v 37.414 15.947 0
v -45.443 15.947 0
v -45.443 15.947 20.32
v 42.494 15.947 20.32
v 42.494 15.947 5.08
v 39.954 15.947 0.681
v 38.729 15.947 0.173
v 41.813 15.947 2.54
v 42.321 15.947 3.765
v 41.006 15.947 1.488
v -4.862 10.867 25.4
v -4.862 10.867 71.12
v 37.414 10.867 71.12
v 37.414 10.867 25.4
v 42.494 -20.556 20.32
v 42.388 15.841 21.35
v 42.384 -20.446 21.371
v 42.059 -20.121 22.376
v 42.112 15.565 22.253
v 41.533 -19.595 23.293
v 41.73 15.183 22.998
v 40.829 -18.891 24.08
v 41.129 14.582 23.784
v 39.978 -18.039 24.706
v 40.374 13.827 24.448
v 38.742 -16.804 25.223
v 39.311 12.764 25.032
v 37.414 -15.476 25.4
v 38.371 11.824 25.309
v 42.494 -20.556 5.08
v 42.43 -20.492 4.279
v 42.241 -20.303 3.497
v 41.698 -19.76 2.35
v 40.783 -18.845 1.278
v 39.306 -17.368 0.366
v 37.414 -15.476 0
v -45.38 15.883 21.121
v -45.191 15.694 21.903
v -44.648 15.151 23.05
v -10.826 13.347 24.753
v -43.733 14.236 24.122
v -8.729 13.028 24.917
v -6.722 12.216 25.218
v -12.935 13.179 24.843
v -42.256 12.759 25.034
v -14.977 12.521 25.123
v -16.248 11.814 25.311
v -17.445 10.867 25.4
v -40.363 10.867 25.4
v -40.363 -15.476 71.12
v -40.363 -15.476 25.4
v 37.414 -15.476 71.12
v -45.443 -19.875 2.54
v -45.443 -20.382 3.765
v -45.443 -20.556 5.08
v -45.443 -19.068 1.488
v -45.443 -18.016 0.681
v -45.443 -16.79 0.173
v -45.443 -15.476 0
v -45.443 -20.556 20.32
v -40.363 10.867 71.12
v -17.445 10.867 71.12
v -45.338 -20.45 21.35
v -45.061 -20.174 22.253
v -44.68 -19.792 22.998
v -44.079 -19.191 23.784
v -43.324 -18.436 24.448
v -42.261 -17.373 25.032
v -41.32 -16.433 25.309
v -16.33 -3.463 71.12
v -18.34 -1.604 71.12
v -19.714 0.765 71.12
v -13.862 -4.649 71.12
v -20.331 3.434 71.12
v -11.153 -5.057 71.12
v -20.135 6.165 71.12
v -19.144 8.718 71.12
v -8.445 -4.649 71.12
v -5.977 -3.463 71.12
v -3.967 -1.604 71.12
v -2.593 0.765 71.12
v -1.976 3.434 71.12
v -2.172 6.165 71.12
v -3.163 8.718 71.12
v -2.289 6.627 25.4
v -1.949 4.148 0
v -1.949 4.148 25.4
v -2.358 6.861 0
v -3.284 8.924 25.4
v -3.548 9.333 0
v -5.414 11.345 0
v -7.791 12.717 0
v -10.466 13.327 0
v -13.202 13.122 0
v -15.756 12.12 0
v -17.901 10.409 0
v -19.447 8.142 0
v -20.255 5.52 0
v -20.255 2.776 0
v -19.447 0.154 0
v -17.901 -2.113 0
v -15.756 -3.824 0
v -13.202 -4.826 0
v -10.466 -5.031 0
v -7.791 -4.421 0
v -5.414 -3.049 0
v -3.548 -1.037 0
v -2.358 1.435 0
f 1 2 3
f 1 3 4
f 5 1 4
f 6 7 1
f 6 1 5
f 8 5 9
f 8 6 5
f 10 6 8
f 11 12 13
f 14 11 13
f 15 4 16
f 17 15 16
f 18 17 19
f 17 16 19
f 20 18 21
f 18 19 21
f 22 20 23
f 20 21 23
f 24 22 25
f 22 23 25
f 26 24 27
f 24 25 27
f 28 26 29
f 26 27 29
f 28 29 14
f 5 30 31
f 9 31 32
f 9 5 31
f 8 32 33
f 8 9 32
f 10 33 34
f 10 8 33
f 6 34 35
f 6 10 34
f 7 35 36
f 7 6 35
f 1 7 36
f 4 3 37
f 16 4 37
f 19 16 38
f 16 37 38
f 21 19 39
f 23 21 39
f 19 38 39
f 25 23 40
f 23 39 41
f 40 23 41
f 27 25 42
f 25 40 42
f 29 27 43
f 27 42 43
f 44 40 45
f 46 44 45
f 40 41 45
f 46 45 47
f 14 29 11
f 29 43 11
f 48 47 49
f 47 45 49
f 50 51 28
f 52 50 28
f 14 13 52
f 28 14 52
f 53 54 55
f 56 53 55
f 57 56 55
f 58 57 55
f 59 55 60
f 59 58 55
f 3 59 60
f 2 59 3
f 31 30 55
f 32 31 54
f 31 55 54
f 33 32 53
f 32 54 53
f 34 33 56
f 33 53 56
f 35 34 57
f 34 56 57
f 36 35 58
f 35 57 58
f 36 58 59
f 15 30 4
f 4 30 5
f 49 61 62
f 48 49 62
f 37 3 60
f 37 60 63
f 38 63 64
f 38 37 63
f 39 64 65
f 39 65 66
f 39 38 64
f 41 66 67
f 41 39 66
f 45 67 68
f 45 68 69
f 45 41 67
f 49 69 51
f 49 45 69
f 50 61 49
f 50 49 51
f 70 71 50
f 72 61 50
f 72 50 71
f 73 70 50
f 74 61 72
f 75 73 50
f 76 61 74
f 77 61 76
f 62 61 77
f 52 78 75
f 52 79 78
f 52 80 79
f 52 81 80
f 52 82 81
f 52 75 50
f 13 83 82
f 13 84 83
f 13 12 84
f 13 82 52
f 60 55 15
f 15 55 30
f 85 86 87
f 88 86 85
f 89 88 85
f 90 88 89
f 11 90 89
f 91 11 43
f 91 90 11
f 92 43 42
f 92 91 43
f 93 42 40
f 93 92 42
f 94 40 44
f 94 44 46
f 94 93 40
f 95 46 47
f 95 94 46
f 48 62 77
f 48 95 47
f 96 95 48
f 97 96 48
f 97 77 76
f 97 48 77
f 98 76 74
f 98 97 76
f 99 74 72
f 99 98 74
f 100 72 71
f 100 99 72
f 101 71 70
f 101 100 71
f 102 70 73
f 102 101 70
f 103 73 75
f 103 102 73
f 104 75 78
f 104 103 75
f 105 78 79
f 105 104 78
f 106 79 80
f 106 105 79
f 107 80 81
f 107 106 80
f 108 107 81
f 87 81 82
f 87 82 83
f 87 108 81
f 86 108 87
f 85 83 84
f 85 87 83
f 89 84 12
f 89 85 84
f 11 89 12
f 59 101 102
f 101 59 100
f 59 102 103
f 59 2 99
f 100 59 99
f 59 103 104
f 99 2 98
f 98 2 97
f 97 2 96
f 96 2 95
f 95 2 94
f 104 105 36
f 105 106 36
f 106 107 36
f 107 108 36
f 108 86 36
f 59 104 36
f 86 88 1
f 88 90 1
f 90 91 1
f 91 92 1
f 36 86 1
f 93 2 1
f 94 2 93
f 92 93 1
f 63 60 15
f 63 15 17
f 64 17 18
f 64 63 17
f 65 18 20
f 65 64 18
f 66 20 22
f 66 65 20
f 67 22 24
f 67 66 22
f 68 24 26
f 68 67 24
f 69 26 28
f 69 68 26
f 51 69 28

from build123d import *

# Parameters (mm, degrees)
F0_W        = 87.937258184
F0_H        = 36.5022588521
F0_R        = 9.2048285636
F1_DEPTH    = 25.4
F2_T1_DEPTH = 113.337258184
F2_T3_DEPTH = 61.9022588521
F3_DEPTH    = 45.72


# Not quite as in the source:
# - a fillet or chamfer that OpenCascade refuses, or shapes differently, is made with other operations: its cross-section is extruded or revolved along the edge and cut away or added


with BuildPart() as f1:
    # F0 (on Top) → F1 (new body)
    with BuildSketch(Plane.XY):
        with Locations((-1.4748387039, -2.3044357076)):
            Rectangle(F0_W, F0_H)
        with Locations((-11.1534688622, 4.1479840875)):
            Circle(F0_R, mode=Mode.SUBTRACT)
    extrude(amount=F1_DEPTH)

    # F2: fillet of radius 5.08 on 6 edges, made by hand

    # F2_s2 → F2_t1 (cut)
    with BuildSketch(Plane.YZ.offset(-58.1434677958)):
        with BuildLine():
            ThreePointArc((-20.5555651337, 20.32), (-19.0676675821, 23.9121024484), (-15.4755651337, 25.4))
            Line((-15.4755651337, 25.4), (-20.5555651337, 25.4))
            Line((-20.5555651337, 25.4), (-20.5555651337, 20.32))
        make_face()
        with BuildLine():
            ThreePointArc((15.9466937184, 20.32), (14.4587961669, 23.9121024484), (10.8666937184, 25.4))
            Line((10.8666937184, 25.4), (15.9466937184, 25.4))
            Line((15.9466937184, 25.4), (15.9466937184, 20.32))
        make_face()
        with BuildLine():
            ThreePointArc((-20.5555651337, 5.08), (-19.0676675821, 1.4878975516), (-15.4755651337, 0))
            Line((-15.4755651337, 0), (-20.5555651337, 0))
            Line((-20.5555651337, 0), (-20.5555651337, 5.08))
        make_face()
    extrude(amount=F2_T1_DEPTH, mode=Mode.SUBTRACT)

    # F2_s4 → F2_t3 (cut)
    with BuildSketch(Plane.XZ.offset(-28.6466937184)):
        with BuildLine():
            ThreePointArc((-45.4434677958, 20.32), (-43.9555702443, 23.9121024484), (-40.3634677958, 25.4))
            Line((-40.3634677958, 25.4), (-45.4434677958, 25.4))
            Line((-45.4434677958, 25.4), (-45.4434677958, 20.32))
        make_face()
        with BuildLine():
            ThreePointArc((42.4937903881, 20.32), (41.0058928365, 23.9121024484), (37.4137903881, 25.4))
            Line((37.4137903881, 25.4), (42.4937903881, 25.4))
            Line((42.4937903881, 25.4), (42.4937903881, 20.32))
        make_face()
        with BuildLine():
            ThreePointArc((42.4937903881, 5.08), (41.0058928365, 1.4878975516), (37.4137903881, 0))
            Line((37.4137903881, 0), (42.4937903881, 0))
            Line((42.4937903881, 0), (42.4937903881, 5.08))
        make_face()
    extrude(amount=F2_T3_DEPTH, mode=Mode.SUBTRACT)

    # F3 (add): a face of the model
    f3_faces = [f1.faces().sort_by_distance(p)[0] for p in [
        (-0.1621567776, -3.0875160288, 25.4),
    ]]
    extrude(f3_faces, amount=F3_DEPTH)


solid = f1.part
